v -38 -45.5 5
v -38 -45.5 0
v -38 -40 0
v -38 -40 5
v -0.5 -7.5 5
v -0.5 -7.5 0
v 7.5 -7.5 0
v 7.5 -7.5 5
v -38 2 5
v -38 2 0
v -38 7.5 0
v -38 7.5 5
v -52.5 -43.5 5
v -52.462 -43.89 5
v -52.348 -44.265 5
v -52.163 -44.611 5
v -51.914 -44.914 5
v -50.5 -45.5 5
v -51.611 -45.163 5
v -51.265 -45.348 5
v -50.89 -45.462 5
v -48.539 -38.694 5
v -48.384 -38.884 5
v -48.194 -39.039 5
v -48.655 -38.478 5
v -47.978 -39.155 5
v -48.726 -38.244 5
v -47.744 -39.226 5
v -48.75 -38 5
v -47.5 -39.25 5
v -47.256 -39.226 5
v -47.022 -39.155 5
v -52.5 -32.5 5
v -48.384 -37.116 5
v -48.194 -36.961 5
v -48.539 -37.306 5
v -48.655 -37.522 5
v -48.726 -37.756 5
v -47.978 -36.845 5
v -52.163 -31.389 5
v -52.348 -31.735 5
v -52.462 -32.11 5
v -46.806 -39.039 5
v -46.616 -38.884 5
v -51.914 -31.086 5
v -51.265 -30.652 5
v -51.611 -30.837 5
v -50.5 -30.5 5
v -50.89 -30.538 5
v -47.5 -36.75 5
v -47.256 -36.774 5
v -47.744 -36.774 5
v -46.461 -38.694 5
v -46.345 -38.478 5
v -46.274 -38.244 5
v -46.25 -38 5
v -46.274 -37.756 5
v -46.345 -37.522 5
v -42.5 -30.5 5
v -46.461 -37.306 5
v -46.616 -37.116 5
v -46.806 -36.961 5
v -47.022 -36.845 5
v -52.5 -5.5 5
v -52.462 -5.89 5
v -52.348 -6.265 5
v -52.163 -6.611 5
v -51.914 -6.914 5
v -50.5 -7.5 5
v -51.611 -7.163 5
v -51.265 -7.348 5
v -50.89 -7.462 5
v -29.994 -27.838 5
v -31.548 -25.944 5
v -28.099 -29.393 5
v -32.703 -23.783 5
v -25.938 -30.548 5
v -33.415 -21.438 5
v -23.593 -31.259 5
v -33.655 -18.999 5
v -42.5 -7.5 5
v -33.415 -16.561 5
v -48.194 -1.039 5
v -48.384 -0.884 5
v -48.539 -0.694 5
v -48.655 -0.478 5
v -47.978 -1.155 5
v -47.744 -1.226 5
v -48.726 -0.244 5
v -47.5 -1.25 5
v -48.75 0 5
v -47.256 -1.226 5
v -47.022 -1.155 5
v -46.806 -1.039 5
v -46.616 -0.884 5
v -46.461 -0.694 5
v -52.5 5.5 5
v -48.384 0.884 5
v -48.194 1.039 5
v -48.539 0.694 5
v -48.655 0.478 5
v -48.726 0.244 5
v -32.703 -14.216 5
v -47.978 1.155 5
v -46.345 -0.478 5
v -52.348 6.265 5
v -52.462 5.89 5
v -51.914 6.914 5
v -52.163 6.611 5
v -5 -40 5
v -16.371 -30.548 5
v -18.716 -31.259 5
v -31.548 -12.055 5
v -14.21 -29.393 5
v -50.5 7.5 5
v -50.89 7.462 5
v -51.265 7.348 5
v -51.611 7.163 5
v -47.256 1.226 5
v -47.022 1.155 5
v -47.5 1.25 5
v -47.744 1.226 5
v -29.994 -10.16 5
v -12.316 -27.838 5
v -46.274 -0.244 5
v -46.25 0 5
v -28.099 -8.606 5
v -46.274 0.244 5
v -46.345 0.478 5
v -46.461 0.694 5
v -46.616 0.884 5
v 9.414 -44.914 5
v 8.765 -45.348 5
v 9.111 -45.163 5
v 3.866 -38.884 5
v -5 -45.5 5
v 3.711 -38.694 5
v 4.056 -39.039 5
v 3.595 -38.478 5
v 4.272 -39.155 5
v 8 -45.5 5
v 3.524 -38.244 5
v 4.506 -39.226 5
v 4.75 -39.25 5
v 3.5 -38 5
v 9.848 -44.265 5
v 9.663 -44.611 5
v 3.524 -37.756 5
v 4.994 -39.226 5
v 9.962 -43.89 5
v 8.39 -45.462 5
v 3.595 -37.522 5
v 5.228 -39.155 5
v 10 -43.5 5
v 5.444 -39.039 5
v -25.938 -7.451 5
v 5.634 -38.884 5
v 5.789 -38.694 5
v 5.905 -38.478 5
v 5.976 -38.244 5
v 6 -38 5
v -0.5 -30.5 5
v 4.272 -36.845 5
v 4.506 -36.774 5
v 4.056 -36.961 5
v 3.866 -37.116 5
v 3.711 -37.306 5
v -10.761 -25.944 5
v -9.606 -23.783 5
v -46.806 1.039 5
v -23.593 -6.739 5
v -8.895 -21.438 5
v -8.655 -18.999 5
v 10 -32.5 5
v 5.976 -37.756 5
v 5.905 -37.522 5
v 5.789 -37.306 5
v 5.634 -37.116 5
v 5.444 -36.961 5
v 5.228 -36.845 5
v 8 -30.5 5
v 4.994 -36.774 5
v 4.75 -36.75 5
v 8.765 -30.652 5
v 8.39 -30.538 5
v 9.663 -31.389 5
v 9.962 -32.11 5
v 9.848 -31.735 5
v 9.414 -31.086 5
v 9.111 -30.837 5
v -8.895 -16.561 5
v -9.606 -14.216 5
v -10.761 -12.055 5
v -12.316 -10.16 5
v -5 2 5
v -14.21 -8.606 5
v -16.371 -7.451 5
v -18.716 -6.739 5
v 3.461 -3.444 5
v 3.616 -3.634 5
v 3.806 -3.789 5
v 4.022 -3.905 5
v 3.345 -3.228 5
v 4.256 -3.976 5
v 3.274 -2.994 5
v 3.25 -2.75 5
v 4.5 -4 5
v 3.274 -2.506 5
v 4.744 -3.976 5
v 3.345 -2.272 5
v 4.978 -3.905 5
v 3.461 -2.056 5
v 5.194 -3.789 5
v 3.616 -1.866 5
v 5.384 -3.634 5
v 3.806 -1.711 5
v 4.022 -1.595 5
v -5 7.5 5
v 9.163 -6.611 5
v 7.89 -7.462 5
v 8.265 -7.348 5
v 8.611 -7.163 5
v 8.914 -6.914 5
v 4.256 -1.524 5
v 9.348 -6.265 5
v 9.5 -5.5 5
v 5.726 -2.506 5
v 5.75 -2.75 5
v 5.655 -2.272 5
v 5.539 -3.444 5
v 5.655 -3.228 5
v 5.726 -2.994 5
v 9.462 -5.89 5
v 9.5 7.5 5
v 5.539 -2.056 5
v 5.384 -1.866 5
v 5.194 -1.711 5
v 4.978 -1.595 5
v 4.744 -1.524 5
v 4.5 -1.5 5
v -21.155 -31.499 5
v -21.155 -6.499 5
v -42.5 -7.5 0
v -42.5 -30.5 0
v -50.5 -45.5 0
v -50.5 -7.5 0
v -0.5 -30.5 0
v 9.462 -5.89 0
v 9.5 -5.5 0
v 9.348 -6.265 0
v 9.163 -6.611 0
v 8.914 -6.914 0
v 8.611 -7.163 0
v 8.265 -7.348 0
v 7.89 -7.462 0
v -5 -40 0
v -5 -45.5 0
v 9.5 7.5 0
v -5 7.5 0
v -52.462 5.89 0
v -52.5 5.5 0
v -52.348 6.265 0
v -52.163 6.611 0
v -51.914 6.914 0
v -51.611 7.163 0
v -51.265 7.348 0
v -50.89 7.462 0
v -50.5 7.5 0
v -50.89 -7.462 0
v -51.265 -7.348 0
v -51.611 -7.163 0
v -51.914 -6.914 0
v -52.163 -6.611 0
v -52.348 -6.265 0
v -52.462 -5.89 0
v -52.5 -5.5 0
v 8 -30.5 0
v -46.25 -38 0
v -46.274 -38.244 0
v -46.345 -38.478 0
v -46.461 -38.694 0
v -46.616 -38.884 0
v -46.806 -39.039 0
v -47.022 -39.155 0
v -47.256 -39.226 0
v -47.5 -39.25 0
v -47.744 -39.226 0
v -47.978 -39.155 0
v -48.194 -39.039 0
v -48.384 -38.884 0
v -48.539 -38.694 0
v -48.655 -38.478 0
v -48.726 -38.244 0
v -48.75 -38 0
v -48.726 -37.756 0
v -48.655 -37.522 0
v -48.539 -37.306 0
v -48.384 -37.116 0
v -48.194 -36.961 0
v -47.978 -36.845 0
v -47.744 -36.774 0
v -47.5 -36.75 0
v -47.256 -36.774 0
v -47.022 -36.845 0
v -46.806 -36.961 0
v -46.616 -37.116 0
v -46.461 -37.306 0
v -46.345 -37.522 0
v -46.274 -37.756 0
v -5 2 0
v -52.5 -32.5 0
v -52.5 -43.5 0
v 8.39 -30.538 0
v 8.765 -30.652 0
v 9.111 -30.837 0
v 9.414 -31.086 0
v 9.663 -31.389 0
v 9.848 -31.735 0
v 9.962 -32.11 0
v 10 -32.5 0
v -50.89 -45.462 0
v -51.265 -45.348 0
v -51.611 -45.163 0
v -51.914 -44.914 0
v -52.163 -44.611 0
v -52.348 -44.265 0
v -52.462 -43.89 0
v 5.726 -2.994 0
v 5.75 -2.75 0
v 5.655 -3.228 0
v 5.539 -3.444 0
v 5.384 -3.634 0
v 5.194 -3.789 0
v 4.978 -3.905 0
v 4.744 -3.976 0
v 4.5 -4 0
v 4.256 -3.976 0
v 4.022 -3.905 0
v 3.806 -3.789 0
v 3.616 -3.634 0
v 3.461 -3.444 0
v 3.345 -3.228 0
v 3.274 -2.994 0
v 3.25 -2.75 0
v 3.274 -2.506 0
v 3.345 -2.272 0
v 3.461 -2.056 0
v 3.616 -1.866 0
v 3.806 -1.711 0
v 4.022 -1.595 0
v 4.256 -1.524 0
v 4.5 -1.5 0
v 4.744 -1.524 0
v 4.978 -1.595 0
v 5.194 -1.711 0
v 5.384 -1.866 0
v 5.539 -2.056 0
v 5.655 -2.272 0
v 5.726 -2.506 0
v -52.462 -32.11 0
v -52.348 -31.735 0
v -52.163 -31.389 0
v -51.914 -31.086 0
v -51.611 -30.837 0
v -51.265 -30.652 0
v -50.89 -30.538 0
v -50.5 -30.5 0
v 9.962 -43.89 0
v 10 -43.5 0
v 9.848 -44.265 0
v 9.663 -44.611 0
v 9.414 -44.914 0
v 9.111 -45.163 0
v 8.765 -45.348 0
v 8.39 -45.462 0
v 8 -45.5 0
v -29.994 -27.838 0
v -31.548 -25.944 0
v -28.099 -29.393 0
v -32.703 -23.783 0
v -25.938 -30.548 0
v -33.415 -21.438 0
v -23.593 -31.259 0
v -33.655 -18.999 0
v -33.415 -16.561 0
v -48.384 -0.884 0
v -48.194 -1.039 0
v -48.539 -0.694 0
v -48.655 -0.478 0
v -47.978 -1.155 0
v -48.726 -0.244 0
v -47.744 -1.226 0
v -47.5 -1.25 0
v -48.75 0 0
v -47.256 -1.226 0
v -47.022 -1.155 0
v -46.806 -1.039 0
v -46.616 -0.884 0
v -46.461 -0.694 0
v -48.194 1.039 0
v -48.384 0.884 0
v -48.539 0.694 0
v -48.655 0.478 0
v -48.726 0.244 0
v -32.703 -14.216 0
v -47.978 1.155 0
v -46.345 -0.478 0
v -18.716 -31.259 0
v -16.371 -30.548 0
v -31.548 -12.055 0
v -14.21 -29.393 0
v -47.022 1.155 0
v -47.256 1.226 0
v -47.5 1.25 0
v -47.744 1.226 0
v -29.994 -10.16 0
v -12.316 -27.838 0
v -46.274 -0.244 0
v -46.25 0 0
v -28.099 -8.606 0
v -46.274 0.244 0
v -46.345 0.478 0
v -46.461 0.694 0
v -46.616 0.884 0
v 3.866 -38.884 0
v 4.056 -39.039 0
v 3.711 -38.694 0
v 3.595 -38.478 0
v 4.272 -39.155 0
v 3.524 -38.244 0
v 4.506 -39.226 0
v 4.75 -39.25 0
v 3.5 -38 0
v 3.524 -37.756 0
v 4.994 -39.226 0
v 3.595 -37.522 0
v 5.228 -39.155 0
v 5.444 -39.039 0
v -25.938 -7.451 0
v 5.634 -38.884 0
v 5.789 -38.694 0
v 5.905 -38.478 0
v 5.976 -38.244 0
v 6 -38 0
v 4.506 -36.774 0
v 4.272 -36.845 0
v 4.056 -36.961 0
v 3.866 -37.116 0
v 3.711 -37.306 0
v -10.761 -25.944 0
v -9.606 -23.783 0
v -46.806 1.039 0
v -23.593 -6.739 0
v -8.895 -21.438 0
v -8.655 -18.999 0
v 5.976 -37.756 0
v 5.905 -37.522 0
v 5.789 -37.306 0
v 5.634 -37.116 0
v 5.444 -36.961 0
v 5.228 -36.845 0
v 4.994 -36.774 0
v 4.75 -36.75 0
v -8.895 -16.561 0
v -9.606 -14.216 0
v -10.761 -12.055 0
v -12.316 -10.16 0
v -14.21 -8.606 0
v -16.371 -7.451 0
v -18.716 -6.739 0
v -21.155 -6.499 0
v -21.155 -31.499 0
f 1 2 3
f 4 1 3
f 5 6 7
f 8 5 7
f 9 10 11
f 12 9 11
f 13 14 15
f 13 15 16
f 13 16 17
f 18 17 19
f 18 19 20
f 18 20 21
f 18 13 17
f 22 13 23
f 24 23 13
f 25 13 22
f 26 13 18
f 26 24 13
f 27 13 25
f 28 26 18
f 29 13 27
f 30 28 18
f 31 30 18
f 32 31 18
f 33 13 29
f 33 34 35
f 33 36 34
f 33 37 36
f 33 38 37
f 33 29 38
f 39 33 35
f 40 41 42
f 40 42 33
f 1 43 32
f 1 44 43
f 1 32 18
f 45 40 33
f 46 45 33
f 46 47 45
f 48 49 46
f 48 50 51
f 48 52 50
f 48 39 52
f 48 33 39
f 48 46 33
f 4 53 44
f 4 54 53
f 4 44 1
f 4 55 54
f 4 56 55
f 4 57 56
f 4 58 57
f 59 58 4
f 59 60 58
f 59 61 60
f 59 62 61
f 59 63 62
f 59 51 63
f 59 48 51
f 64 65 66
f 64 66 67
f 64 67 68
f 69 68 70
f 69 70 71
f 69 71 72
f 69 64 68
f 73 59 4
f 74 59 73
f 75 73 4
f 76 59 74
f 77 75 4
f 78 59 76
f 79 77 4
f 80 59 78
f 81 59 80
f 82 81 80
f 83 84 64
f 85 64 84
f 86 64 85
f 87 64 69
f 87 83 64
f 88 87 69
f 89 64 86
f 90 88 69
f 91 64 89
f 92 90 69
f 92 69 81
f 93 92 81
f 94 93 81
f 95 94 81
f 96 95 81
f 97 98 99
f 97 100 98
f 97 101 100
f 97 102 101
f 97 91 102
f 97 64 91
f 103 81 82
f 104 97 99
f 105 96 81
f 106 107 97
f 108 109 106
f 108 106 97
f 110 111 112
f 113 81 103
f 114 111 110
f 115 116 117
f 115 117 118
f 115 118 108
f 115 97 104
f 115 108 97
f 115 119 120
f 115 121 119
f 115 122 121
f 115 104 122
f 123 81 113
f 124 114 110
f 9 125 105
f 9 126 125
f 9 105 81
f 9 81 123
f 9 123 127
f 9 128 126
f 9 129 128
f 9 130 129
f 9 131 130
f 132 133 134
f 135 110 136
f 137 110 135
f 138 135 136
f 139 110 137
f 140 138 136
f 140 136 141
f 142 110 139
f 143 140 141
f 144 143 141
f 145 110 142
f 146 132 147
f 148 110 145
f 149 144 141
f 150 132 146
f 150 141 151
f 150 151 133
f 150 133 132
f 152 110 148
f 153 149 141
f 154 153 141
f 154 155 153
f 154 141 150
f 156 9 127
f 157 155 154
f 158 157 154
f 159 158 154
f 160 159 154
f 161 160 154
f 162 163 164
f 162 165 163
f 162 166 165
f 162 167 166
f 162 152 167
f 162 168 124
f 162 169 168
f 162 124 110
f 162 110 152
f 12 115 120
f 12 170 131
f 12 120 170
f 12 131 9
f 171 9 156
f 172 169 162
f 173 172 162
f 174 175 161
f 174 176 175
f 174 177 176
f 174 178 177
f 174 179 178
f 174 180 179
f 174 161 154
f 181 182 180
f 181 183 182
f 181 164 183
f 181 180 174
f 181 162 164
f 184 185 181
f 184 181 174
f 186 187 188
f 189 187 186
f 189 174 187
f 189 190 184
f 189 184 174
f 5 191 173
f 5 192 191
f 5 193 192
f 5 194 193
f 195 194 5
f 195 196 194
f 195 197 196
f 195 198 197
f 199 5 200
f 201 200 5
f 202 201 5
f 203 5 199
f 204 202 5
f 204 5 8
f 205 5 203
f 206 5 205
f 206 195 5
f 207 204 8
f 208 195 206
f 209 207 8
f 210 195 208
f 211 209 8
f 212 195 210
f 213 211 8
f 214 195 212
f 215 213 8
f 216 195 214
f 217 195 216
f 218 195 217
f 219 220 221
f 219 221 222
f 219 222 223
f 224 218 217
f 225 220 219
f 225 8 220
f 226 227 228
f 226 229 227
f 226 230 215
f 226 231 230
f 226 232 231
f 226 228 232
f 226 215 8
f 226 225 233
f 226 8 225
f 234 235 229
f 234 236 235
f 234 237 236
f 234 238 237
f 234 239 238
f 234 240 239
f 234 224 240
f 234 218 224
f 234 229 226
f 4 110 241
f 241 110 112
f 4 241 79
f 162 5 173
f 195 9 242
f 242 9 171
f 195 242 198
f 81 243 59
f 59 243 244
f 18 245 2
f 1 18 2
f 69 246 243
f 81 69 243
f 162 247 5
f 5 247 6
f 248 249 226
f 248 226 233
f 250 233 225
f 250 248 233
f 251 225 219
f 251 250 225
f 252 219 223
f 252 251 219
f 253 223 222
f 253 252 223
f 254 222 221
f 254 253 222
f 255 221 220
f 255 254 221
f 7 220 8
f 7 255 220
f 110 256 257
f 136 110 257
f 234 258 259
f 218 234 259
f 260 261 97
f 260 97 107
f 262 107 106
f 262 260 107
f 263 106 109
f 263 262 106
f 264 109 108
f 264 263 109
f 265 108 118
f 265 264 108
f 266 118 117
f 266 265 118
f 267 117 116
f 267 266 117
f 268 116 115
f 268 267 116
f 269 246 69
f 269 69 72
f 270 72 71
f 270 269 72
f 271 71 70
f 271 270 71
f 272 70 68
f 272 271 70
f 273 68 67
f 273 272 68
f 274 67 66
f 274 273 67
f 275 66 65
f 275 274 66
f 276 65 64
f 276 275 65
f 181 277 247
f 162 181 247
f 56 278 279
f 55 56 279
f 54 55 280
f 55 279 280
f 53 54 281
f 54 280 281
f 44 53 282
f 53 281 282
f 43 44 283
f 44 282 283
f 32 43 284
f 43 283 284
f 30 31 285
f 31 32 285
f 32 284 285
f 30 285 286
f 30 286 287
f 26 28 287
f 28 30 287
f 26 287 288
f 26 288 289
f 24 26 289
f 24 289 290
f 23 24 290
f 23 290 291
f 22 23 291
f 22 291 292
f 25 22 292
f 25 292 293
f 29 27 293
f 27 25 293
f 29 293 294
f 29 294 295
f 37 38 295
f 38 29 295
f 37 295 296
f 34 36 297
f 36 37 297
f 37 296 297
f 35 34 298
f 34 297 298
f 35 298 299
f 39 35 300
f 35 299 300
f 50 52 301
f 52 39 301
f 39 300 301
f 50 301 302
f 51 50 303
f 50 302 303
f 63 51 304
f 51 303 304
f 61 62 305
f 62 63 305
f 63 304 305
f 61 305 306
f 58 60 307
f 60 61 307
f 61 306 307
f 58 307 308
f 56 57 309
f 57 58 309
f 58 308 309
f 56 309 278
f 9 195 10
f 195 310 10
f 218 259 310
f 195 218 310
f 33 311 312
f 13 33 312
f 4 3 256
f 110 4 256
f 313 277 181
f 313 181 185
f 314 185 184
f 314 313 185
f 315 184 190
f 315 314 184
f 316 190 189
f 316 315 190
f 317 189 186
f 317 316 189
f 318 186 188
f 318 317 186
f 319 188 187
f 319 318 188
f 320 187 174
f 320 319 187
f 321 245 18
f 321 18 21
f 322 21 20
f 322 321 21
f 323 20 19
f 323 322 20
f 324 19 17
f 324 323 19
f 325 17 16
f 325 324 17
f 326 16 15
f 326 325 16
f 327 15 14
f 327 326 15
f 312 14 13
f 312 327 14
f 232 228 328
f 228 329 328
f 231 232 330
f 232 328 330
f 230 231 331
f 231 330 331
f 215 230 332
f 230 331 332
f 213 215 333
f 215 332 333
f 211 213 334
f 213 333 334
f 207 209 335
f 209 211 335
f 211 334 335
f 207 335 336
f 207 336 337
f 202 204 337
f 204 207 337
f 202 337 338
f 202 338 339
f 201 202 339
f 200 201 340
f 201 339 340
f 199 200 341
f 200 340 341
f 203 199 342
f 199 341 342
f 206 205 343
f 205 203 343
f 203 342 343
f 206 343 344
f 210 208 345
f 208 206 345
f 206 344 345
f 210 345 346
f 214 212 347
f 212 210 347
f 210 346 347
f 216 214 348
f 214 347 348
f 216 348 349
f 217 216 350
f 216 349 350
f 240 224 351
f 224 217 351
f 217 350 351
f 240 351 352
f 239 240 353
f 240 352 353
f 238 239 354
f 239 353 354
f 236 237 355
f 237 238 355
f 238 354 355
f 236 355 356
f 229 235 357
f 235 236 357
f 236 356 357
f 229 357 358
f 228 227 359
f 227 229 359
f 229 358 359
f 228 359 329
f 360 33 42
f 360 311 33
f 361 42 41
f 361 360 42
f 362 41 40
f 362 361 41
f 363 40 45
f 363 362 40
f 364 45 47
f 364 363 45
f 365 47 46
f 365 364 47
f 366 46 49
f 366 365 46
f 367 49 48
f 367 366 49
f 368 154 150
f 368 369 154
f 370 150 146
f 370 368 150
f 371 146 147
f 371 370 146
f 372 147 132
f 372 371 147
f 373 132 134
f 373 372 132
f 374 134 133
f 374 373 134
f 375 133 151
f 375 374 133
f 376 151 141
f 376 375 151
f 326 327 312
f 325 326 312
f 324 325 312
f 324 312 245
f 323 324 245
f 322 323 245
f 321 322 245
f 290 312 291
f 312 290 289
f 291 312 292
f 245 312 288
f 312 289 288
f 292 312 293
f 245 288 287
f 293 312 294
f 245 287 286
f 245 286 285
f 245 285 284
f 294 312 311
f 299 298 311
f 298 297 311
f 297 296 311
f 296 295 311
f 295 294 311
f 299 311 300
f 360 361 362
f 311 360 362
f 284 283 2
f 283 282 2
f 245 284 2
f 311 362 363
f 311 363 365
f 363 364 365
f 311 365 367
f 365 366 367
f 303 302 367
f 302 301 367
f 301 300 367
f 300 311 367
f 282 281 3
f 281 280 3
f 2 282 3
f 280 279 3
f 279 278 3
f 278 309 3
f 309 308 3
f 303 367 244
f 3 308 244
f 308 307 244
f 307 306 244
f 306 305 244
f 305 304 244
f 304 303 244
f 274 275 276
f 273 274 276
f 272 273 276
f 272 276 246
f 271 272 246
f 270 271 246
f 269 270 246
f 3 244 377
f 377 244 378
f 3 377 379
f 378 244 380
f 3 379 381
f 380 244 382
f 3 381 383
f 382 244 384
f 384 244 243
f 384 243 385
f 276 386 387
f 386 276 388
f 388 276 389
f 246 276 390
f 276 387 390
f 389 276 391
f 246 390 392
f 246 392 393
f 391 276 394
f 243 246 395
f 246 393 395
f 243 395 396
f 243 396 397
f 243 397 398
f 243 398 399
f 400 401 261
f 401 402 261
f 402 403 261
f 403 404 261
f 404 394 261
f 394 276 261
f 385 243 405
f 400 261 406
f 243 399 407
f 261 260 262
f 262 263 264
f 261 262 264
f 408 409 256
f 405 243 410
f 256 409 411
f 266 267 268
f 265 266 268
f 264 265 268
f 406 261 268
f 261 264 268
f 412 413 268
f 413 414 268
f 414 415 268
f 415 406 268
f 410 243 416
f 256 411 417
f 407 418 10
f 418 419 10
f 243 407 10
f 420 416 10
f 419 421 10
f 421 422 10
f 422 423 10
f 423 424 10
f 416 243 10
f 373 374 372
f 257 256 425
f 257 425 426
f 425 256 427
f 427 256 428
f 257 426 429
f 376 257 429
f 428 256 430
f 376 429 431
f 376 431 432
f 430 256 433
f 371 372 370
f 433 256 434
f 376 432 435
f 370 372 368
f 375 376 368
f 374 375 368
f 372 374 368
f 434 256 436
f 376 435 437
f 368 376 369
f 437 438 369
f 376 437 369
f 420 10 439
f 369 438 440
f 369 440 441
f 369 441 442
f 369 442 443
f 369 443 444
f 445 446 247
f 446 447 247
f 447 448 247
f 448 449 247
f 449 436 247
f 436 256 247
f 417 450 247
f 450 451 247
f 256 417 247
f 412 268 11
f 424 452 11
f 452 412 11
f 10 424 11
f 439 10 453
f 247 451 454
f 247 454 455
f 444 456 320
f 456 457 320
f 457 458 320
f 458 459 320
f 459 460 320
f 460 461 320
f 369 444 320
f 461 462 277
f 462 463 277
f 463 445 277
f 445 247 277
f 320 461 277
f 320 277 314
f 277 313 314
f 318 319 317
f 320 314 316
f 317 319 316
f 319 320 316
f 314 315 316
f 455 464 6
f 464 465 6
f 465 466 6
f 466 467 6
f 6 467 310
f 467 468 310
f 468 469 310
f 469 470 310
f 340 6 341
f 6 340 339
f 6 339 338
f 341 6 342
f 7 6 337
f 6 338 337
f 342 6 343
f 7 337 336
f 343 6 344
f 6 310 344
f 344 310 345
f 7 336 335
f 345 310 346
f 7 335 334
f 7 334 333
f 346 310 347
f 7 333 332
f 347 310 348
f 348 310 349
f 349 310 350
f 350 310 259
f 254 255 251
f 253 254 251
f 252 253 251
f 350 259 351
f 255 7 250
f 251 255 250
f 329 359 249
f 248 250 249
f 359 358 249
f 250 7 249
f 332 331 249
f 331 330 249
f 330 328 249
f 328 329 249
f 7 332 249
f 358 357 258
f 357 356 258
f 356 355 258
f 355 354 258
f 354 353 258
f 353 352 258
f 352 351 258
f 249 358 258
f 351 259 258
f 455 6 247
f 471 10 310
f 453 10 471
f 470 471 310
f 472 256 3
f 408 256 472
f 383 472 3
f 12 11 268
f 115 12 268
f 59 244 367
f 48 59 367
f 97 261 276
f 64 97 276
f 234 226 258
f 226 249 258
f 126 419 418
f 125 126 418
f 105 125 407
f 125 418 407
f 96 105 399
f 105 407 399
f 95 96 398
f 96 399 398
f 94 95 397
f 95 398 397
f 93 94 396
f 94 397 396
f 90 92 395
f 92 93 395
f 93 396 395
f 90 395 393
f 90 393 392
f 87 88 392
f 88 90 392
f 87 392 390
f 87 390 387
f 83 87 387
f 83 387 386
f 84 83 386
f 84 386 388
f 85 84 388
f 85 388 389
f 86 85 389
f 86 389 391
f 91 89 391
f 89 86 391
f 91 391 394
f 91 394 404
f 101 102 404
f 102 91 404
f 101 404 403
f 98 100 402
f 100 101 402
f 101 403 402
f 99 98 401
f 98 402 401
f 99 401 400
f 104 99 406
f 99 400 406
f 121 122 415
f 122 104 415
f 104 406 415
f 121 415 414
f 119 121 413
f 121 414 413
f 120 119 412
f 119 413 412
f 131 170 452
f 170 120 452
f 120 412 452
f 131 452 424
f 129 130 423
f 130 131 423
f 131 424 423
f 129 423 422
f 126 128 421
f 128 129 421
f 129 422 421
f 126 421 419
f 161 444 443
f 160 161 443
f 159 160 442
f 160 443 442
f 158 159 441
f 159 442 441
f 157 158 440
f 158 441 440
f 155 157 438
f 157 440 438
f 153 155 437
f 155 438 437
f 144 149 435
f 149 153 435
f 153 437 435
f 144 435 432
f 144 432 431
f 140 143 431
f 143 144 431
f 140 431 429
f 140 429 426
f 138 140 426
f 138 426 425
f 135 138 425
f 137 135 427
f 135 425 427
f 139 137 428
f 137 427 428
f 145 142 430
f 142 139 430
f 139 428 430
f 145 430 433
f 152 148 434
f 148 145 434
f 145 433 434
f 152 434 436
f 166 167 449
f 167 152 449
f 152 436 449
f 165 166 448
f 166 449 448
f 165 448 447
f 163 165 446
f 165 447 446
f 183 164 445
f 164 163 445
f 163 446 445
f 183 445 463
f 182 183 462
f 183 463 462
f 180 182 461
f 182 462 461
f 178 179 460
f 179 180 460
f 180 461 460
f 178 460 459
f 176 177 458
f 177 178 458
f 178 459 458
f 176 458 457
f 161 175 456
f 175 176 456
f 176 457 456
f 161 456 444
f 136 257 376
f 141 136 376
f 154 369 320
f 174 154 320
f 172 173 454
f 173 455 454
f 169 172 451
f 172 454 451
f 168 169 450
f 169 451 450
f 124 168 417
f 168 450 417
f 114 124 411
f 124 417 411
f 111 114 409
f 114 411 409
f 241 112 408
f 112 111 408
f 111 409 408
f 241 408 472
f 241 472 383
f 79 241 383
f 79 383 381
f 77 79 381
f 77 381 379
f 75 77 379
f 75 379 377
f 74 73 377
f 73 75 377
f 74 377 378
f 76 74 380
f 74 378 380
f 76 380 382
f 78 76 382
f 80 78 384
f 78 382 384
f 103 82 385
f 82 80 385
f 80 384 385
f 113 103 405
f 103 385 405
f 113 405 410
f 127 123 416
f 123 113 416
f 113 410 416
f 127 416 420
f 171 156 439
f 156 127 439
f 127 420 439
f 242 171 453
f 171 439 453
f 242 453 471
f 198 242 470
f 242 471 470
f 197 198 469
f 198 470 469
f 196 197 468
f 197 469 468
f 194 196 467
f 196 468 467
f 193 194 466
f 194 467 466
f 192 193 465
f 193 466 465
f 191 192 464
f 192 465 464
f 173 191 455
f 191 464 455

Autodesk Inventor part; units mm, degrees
ref_plane "YZ Plane" through (0, 0, 0) normal (1, 0, 0) x (0, 1, 0)
ref_plane "XZ Plane" through (0, 0, 0) normal (0, 1, 0) x (-1, 0, 0)
ref_plane "XY Plane" through (0, 0, 0) normal (0, 0, 1) x (1, 0, 0)
sketch "Sketch2" plane through (0, 0, 0) normal (0, 0, 1) x (1, 0, 0)
  circle A0 centre (4.5, -2.75) radius 1.25 projected
  line L0 (9.5, 7.5) -> (-5, 7.5) projected
  line L1 (-5, 7.5) -> (-5, 2) projected
  line L2 (-5, 2) -> (-0.5, 2) projected
  line L3 (-0.5, 2) -> (-0.5, -7.5) projected
  line L4 (-0.5, -7.5) -> (7.5, -7.5) projected
  line L5 (9.5, -5.5) -> (9.5, 7.5) projected
  circle A1 centre (4.75, -38) radius 1.25 projected
  line L6 (-5, -45.5) -> (8, -45.5) projected
  line L7 (10, -43.5) -> (10, -32.5) projected
  line L8 (8, -30.5) -> (-0.5, -30.5) projected
  line L9 (-0.5, -30.5) -> (-0.5, -40) projected
  line L10 (-0.5, -40) -> (-5, -40) projected
  line L11 (-5, -40) -> (-5, -45.5) projected
  circle A2 centre (-47.5, -38) radius 1.25 projected
  line L12 (-38, -40) -> (-42.5, -40) projected
  line L13 (-42.5, -40) -> (-42.5, -30.5) projected
  line L14 (-42.5, -30.5) -> (-50.5, -30.5) projected
  line L15 (-52.5, -32.5) -> (-52.5, -43.5) projected
  line L16 (-50.5, -45.5) -> (-38, -45.5) projected
  line L17 (-38, -45.5) -> (-38, -40) projected
  circle A3 centre (-47.5, 0) radius 1.25 projected
  line L18 (-42.5, -7.5) -> (-42.5, 2) projected
  line L19 (-42.5, 2) -> (-38, 2) projected
  line L20 (-38, 2) -> (-38, 7.5) projected
  line L21 (-38, 7.5) -> (-50.5, 7.5) projected
  line L22 (-52.5, 5.5) -> (-52.5, -5.5) projected
  line L23 (-50.5, -7.5) -> (-42.5, -7.5) projected
  circle A4 centre (-21.1548, -18.9993) radius 2.5 projected
  circle A5 centre (-21.1548, -18.9993) radius 12.5 projected
  line L24 (-0.5, 2) -> (-42.5, 2)
  line L25 (-42.5, 2) -> (-42.5, -40)
  line L26 (-42.5, -40) -> (-0.5, -40)
  line L27 (-0.5, -40) -> (-0.5, 2)
  arc A6 (-52.5, -5.5) -> (-50.5, -7.5) centre (-50.5, -5.5) ccw projected
  arc A7 (-50.5, 7.5) -> (-52.5, 5.5) centre (-50.5, 5.5) ccw projected
  arc A8 (8, -45.5) -> (10, -43.5) centre (8, -43.5) ccw projected
  arc A9 (10, -32.5) -> (8, -30.5) centre (8, -32.5) ccw projected
  arc A10 (7.5, -7.5) -> (9.5, -5.5) centre (7.5, -5.5) ccw projected
  arc A11 (-52.5, -43.5) -> (-50.5, -45.5) centre (-50.5, -43.5) ccw projected
  arc A12 (-50.5, -30.5) -> (-52.5, -32.5) centre (-50.5, -32.5) ccw projected
  line L28 (9.5, 2) -> (-52.5, 2)
  line L29 (9.5, 2) -> (-52.5, 2)
  point P0 (0, 0)
extrude "Extrusion1" add sketch "Sketch2" along normal blind 5 contours L5 L28 L2 L1 L0 | L5 A10 L4 L3 L28 | L2 L3 L27 L9 L10 L26 L12 L13 L25 L18 L19 L24 | L19 L28 L22 A7 L21 L20 | L18 L23 A6 L22 L28 | L8 A9 L7 A8 L6 L11 L10 L9 | L13 L12 L17 L16 A11 L15 A12 L14
properties part number "Drzalo_motorja"
